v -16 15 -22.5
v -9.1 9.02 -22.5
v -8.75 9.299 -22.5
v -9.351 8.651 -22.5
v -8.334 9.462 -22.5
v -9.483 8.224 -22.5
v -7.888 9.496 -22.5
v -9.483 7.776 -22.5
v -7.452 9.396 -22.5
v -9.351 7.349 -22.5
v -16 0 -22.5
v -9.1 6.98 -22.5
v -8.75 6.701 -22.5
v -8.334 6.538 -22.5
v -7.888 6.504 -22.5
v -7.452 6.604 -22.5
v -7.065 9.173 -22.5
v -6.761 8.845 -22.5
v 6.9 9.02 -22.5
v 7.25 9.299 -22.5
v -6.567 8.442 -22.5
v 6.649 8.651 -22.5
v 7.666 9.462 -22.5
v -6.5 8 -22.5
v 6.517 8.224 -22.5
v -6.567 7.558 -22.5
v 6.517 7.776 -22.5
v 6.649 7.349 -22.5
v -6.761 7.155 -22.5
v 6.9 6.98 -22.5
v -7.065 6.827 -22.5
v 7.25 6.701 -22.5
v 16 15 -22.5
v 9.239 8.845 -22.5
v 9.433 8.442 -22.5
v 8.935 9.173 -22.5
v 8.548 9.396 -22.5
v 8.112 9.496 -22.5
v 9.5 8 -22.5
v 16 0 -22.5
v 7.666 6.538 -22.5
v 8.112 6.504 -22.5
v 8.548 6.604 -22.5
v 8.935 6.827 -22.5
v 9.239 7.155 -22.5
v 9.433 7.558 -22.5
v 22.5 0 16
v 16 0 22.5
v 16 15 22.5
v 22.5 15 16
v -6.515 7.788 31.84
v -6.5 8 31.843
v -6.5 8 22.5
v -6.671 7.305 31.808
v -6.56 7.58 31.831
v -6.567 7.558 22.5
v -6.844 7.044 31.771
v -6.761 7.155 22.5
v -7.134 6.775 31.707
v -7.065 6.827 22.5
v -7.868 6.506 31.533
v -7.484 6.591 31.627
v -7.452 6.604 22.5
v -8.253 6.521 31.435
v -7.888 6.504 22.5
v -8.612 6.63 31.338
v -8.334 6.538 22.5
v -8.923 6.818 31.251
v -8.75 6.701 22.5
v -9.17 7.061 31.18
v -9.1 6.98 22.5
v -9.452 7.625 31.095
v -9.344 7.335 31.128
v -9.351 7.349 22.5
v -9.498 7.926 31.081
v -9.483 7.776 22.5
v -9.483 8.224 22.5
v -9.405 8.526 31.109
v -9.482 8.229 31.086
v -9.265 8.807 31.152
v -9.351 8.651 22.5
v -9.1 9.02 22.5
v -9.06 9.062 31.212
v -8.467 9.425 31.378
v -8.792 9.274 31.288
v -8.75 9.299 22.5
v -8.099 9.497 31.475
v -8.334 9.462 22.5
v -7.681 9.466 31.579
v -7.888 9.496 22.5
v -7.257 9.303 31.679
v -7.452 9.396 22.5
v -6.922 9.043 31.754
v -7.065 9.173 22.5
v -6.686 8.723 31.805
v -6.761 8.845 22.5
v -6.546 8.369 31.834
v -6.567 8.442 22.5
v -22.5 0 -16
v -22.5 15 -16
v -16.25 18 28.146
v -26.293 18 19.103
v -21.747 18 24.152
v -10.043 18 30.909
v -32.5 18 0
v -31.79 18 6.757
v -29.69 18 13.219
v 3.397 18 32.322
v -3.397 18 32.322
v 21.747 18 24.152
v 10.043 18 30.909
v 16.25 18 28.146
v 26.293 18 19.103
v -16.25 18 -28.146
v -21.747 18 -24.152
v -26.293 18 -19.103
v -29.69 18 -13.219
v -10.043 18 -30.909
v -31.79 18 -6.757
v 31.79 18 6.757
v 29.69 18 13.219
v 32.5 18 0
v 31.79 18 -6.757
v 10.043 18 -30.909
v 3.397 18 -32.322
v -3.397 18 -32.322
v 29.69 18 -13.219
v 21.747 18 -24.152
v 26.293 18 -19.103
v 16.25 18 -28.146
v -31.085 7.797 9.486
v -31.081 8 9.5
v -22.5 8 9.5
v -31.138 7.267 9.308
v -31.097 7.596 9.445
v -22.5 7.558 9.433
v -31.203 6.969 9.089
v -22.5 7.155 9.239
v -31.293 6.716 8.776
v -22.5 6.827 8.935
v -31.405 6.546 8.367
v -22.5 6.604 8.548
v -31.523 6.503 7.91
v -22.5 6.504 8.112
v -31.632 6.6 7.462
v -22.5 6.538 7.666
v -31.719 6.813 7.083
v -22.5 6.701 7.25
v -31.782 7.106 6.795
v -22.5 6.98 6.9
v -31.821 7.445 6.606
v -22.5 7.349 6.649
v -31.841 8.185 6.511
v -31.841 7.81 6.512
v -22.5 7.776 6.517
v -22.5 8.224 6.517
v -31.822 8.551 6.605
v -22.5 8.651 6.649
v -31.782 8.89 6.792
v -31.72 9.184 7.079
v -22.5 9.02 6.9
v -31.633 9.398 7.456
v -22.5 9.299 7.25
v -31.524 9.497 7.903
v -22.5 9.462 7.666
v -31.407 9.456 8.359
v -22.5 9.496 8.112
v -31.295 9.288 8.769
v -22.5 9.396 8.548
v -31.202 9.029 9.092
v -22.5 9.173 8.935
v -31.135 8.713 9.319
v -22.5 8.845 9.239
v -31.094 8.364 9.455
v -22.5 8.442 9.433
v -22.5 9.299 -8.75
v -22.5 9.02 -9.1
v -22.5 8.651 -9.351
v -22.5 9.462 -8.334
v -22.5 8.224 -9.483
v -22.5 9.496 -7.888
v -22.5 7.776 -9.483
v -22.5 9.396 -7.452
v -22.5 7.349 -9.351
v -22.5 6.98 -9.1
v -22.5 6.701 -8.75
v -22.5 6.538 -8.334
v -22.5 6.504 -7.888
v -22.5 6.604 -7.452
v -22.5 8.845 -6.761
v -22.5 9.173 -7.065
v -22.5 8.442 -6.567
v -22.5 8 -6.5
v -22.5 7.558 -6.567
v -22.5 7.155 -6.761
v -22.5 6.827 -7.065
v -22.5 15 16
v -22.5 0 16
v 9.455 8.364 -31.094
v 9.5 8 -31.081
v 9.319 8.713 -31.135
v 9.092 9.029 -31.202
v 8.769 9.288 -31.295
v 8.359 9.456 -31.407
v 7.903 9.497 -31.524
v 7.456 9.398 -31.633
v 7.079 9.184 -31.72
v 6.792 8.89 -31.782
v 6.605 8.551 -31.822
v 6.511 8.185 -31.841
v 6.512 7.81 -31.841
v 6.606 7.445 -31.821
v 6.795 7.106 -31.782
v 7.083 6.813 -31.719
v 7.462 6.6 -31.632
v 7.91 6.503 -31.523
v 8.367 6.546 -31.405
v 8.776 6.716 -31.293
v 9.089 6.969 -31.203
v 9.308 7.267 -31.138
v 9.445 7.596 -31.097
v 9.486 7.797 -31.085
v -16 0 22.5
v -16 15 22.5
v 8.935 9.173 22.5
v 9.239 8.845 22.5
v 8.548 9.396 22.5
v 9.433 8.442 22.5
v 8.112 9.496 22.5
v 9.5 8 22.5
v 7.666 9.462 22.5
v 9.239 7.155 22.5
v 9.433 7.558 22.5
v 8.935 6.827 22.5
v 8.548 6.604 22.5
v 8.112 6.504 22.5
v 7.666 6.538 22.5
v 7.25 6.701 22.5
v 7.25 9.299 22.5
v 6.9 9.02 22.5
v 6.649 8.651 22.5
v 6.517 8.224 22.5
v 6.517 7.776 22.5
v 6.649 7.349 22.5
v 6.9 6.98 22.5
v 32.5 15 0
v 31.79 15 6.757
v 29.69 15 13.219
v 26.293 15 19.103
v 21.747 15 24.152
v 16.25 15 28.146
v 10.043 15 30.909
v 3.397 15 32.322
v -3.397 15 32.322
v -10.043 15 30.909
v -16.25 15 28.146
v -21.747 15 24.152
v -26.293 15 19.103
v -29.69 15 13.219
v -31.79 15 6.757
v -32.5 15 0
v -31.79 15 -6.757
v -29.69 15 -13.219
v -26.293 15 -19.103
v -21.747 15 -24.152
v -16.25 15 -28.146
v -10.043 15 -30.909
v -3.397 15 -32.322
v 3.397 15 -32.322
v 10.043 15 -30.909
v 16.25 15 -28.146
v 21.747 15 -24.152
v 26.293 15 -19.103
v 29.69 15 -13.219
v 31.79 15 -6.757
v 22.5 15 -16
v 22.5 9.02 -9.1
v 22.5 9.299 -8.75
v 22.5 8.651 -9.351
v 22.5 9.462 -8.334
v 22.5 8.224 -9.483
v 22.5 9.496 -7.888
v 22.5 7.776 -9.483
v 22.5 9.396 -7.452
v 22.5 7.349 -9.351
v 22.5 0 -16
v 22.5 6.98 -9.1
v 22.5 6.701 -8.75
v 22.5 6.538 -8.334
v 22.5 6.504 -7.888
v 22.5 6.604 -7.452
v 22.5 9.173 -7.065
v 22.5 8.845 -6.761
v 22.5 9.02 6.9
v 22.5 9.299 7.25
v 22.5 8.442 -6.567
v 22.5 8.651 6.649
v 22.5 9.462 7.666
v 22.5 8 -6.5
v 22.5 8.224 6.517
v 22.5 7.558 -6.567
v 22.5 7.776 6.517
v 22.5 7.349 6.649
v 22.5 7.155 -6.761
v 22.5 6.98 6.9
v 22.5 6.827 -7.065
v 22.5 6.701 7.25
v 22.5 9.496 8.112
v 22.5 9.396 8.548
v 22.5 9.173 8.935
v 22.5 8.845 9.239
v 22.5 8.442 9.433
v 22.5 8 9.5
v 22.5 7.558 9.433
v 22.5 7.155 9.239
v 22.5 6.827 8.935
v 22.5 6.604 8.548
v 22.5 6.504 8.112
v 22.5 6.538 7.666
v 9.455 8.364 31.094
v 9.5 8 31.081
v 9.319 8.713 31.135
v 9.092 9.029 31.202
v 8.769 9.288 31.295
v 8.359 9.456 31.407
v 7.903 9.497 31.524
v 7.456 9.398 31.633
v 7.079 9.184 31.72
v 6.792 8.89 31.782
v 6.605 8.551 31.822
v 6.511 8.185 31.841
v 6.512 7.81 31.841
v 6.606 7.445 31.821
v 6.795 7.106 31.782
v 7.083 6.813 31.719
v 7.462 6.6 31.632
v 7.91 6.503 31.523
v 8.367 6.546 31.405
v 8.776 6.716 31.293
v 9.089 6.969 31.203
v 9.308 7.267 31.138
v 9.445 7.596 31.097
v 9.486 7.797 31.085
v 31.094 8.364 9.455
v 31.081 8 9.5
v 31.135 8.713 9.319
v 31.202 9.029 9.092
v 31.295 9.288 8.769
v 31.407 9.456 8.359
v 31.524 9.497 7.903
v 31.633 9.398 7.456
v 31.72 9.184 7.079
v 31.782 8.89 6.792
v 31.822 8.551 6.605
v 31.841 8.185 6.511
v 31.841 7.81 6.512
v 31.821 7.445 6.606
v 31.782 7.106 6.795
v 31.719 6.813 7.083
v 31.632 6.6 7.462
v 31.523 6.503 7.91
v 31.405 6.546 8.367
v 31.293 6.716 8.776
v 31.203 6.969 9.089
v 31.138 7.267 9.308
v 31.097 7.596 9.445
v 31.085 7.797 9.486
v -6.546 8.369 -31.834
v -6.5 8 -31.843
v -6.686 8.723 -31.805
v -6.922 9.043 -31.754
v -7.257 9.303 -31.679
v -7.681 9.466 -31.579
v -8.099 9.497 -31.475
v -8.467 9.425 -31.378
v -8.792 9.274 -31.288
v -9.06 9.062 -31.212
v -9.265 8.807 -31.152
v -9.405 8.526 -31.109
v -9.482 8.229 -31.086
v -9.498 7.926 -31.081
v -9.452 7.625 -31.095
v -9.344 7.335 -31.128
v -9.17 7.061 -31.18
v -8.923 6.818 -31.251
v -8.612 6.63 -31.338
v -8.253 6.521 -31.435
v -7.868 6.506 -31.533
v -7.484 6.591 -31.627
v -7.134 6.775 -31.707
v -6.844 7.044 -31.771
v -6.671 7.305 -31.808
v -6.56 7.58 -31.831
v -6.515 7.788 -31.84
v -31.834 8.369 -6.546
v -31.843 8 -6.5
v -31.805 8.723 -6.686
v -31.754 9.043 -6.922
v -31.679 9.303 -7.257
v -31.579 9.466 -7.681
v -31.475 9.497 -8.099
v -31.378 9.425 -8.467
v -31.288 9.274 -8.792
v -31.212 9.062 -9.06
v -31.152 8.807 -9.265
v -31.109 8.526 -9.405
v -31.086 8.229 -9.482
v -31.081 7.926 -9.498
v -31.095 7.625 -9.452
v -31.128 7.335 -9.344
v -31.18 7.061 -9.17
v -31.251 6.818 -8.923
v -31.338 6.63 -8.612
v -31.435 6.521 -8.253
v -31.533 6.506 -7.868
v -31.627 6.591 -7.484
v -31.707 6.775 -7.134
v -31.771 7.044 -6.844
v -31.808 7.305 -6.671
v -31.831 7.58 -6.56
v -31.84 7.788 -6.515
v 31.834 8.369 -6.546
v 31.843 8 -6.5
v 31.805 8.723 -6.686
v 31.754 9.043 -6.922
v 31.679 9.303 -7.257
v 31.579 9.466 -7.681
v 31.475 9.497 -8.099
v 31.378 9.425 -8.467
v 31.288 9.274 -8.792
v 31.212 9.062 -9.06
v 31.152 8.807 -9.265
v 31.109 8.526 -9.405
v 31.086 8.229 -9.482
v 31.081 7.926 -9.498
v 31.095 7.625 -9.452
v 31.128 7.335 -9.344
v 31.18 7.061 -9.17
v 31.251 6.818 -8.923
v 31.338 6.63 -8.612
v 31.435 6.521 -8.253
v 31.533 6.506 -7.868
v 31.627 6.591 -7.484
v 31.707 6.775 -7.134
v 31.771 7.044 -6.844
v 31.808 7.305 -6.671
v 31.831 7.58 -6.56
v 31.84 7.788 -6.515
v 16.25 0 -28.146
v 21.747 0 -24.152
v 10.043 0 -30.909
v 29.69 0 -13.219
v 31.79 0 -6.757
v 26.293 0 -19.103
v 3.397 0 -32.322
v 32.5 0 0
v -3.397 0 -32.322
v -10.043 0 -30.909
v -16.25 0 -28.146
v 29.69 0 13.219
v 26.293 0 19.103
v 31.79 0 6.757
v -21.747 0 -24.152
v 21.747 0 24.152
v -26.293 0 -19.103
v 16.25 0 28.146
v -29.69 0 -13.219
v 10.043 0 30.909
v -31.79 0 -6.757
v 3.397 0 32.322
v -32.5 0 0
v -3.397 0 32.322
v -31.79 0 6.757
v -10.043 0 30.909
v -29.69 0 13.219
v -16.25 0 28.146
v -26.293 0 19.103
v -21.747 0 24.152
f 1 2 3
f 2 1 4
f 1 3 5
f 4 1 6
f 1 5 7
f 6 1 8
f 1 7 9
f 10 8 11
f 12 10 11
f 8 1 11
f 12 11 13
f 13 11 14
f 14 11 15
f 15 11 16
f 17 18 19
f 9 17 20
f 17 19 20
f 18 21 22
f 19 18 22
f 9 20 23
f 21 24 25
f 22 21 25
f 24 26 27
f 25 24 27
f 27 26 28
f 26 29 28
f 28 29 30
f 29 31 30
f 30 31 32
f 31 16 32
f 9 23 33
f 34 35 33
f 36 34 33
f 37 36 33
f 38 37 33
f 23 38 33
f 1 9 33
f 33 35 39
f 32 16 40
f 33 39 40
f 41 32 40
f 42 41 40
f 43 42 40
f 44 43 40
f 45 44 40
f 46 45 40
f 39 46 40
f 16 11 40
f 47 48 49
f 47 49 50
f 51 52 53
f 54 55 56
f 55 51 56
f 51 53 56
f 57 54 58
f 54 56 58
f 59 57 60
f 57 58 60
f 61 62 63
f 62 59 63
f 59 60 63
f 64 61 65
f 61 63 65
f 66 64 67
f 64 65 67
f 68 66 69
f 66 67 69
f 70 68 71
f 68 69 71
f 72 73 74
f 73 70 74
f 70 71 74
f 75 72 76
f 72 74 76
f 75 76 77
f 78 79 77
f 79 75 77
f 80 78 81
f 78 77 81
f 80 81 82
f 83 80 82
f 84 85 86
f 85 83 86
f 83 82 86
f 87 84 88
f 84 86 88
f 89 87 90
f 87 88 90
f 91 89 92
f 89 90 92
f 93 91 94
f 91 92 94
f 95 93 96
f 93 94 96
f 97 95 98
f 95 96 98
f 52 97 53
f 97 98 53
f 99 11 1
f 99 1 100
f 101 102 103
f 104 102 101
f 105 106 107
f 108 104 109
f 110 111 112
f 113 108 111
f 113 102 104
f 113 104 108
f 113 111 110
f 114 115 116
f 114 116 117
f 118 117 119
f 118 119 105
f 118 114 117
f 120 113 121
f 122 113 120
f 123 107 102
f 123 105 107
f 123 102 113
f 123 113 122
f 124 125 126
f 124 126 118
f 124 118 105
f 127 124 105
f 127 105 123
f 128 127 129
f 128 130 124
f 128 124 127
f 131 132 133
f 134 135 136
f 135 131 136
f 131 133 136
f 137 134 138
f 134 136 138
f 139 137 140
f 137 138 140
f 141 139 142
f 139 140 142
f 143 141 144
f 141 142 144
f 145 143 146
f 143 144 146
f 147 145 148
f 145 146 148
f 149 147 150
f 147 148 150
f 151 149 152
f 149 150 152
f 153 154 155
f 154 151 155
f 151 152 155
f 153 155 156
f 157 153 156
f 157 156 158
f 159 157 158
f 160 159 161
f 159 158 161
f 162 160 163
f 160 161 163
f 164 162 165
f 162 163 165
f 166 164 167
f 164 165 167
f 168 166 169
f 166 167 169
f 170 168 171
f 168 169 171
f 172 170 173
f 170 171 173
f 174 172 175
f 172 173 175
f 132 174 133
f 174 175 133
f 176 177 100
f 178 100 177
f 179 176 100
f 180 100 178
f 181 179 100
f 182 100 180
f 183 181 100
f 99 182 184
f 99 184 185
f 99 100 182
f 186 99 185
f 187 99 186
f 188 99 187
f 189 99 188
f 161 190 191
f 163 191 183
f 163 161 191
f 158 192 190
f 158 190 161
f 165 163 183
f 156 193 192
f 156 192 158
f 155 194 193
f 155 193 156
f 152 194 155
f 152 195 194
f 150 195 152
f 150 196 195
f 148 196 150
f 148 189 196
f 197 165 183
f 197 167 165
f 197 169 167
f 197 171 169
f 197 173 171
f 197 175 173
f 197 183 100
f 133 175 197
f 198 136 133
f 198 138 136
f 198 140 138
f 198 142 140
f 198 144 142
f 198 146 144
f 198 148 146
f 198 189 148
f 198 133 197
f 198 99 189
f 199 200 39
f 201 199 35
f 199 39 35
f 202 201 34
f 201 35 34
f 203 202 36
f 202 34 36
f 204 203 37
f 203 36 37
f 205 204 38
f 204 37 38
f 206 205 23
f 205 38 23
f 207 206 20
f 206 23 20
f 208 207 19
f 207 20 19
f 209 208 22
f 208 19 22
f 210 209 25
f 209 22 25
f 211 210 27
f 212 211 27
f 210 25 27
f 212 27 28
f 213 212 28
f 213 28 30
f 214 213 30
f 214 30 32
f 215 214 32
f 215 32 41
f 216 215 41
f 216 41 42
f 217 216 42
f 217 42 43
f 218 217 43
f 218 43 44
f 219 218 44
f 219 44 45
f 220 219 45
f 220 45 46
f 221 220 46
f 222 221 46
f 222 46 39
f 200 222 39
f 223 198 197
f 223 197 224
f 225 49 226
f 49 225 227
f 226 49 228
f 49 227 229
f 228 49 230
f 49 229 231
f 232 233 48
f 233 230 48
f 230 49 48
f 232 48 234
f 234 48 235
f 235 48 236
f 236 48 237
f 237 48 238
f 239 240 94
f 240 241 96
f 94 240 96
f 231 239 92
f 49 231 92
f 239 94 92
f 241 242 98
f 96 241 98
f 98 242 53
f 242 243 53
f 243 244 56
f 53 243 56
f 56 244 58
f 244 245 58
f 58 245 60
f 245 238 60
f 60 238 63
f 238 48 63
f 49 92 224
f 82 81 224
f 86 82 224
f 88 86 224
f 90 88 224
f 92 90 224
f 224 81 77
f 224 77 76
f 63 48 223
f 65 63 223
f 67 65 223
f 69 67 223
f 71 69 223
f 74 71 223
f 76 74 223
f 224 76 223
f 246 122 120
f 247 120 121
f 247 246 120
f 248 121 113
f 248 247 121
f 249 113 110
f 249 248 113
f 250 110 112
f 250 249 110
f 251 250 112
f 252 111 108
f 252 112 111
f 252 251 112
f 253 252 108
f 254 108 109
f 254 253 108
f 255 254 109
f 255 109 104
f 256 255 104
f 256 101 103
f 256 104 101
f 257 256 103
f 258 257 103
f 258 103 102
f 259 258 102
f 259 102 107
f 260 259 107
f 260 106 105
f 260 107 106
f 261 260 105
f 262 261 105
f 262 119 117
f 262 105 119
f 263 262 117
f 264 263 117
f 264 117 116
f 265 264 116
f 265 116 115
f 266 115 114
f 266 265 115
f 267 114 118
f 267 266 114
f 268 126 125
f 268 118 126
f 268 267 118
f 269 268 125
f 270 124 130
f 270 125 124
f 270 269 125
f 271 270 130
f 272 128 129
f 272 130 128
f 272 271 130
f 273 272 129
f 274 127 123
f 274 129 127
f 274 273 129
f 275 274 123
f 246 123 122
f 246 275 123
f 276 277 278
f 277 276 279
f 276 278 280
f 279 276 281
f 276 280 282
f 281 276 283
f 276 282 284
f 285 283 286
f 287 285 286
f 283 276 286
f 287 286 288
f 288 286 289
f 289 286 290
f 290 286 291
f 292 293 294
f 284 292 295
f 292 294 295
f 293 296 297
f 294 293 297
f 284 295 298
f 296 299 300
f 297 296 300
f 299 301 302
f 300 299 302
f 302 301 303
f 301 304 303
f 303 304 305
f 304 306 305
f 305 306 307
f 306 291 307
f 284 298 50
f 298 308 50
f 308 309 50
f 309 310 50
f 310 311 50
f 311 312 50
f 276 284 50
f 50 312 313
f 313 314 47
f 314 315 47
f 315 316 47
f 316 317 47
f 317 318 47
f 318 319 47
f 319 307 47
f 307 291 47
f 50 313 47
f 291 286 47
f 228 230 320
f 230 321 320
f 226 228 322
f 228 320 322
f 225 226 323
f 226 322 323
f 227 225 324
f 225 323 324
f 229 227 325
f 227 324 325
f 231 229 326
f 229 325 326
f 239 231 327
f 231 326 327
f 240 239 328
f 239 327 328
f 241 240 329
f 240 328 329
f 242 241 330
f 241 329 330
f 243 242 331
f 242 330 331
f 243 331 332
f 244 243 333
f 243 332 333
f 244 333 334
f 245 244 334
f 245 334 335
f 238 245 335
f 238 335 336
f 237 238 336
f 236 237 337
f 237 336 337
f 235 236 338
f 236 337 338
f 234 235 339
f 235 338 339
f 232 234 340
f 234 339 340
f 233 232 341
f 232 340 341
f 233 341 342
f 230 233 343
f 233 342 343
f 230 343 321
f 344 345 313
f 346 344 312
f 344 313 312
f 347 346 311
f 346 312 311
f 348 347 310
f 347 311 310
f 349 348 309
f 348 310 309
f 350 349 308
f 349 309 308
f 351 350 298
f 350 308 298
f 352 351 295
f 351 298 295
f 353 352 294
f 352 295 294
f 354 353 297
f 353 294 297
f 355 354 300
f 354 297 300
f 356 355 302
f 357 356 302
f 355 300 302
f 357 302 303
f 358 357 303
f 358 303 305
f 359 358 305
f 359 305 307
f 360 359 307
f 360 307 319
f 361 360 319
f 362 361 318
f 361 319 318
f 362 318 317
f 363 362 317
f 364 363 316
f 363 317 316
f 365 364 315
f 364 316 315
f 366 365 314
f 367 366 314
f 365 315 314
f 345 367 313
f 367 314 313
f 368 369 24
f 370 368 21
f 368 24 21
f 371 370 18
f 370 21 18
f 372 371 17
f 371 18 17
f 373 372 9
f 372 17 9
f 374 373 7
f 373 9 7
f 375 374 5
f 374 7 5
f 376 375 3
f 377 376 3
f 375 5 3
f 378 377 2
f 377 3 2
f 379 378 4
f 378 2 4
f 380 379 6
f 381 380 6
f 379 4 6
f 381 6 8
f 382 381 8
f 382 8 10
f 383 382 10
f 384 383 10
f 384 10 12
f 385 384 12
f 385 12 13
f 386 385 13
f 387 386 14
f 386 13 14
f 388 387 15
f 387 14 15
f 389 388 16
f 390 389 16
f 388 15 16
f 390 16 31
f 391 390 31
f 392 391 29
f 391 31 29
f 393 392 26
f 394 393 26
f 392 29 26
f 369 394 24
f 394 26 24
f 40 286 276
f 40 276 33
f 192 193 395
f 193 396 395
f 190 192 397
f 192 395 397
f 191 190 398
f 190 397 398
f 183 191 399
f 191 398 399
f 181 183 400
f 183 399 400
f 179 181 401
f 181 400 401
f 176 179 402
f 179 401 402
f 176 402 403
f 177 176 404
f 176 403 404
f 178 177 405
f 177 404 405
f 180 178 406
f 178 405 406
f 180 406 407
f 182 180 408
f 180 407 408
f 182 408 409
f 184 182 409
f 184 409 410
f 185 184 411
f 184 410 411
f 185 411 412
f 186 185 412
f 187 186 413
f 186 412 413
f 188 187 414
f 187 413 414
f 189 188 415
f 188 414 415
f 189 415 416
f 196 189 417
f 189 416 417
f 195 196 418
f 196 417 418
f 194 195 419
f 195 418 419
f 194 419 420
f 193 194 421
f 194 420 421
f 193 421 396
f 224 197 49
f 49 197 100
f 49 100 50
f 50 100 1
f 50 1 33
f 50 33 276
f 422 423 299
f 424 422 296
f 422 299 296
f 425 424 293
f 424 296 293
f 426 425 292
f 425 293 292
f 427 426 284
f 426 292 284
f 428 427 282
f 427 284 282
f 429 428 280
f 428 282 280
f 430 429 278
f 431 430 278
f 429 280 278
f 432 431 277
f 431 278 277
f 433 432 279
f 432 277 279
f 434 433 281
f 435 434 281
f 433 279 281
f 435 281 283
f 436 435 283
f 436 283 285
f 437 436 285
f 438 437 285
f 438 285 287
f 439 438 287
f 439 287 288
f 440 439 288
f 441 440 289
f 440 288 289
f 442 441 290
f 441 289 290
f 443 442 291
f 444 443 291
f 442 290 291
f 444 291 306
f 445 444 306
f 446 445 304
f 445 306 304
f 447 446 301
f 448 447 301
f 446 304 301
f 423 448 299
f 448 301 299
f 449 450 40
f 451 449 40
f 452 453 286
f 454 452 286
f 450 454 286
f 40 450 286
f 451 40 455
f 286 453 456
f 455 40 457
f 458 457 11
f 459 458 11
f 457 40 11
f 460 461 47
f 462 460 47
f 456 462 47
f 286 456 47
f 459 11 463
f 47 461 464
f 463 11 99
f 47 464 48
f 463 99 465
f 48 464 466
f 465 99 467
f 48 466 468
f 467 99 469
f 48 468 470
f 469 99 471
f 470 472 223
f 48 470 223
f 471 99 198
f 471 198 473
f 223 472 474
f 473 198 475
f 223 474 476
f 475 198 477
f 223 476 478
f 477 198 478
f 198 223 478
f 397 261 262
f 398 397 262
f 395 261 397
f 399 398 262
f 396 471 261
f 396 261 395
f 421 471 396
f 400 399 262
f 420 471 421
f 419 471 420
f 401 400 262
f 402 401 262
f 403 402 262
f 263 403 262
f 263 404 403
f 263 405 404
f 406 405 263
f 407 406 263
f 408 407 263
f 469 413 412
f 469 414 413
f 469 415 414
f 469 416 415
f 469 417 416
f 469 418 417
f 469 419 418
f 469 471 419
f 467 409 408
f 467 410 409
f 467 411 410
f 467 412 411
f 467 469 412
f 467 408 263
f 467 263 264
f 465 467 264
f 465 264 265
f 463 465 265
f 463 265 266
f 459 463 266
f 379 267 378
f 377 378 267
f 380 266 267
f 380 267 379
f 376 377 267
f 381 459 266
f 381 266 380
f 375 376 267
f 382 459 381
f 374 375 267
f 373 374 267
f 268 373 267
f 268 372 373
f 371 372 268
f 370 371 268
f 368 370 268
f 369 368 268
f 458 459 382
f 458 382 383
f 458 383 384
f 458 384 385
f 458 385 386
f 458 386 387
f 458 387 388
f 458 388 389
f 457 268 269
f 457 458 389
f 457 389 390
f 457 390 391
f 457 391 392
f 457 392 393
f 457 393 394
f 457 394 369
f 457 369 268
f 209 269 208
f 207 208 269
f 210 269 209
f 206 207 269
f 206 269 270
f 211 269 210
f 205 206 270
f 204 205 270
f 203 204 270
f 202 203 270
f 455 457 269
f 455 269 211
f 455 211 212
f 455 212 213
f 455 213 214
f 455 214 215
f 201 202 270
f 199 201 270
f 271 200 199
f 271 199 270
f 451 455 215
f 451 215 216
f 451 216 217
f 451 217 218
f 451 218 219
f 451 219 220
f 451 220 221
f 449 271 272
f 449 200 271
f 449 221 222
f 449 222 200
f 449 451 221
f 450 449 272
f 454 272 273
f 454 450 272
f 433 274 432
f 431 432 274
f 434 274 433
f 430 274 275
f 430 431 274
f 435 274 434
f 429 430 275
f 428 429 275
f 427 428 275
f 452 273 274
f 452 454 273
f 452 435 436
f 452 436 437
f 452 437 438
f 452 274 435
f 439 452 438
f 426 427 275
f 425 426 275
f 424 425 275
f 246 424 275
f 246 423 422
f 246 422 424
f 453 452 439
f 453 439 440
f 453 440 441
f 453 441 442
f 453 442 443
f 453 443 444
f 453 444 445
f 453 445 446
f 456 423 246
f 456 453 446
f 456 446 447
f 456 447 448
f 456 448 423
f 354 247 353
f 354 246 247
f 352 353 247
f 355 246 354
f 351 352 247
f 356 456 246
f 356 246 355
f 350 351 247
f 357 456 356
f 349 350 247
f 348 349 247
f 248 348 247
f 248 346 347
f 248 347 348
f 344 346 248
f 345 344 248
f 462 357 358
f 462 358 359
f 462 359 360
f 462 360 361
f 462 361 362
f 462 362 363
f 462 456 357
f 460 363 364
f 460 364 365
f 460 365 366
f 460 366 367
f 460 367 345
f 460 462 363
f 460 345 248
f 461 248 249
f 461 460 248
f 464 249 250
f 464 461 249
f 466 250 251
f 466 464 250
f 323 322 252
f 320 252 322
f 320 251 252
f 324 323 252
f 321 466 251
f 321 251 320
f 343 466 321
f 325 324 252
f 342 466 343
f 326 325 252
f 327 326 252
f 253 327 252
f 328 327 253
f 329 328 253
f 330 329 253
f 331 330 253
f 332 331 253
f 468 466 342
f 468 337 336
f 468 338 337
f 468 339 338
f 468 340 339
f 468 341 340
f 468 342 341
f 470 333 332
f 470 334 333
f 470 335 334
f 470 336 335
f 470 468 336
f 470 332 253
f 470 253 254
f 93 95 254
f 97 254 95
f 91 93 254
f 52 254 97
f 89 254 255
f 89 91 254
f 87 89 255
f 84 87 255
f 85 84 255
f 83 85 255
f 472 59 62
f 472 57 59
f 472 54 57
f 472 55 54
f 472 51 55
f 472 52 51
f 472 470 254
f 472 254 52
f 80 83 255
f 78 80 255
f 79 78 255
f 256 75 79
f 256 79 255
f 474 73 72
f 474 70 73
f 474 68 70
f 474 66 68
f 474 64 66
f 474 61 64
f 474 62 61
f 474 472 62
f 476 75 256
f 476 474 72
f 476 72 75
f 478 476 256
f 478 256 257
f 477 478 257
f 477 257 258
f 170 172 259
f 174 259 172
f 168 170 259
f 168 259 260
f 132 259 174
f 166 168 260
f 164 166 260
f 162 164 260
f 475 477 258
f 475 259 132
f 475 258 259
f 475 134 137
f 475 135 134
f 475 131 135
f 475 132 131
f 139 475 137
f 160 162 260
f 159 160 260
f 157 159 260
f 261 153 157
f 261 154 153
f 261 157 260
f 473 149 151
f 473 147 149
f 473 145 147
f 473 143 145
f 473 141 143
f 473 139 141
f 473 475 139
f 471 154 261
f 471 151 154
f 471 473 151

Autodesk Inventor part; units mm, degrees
ref_plane "YZ Plane" through (0, 0, 0) normal (1, 0, 0) x (0, 1, 0)
ref_plane "XZ Plane" through (0, 0, 0) normal (0, 1, 0) x (-1, 0, 0)
ref_plane "XY Plane" through (0, 0, 0) normal (0, 0, 1) x (1, 0, 0)
sketch "Boceto1" plane through (0, 0, 0) normal (0, 1, 0) x (-1, 0, 0)
  circle A0 centre (0, 0) radius 32.5
  line L0 (0, 0) -> (22.5, 0)
  line L1 (22.5, 0) -> (22.5, -16)
  line L2 (22.5, -16) -> (22.5, 16)
  line L3 (0, 0) -> (0, 22.5)
  line L4 (0, 22.5) -> (16, 22.5)
  line L5 (16, 22.5) -> (-16, 22.5)
  line L6 (0, 0) -> (-22.5, 0)
  line L7 (-22.5, 0) -> (-22.5, 16)
  line L8 (-22.5, 16) -> (-22.5, -16)
  line L9 (0, 0) -> (0, -22.5)
  line L10 (0, -22.5) -> (-16, -22.5)
  line L11 (-16, -22.5) -> (16, -22.5)
  line L12 (22.5, 16) -> (16, 22.5)
  line L13 (-16, 22.5) -> (-22.5, 16)
  line L14 (-22.5, -16) -> (-16, -22.5)
  line L15 (16, -22.5) -> (22.5, -16)
  dimension "d0" = 65
  dimension "d1" = 22.5
  dimension "d3" = 16
  dimension "d4" = 32
  dimension "d7" = 360
extrude "Extrusión1" add sketch "Boceto1" along normal blind 15
sketch "Boceto2" plane through (-16, 0, -22.5) normal (0, 0, 1) x (1, 0, 0)
  line L0 (16, 0) -> (16, 8)
  line L1 (16, 8) -> (24, 8)
  line L2 (24, 8) -> (8, 8)
  circle A0 centre (8, 8) radius 1.5
  circle A1 centre (24, 8) radius 1.5
  dimension "d11" = 8
  dimension "d12" = 8
  dimension "d13" = 16
  dimension "d15" = 3
  dimension "d16" = 3
extrude "Extrusión2" cut sketch "Boceto2" along normal mid plane 10200
sketch "Boceto3" plane through (22.5, 0, -16) normal (-1, 0, 0) x (0, 0, 1)
  line L0 (16, 0) -> (16, 8)
  line L1 (16, 8) -> (24, 8)
  line L2 (24, 8) -> (8, 8)
  circle A0 centre (8, 8) radius 1.5
  circle A1 centre (24, 8) radius 1.5
  dimension "d19" = 8
  dimension "d20" = 8
  dimension "d21" = 16
  dimension "d22" = 3
  dimension "d23" = 3
extrude "Extrusión3" cut sketch "Boceto3" against normal mid plane 10200
sketch "Boceto4" plane through (0, 15, 0) normal (0, 1, 0) x (1, 0, 0)
  circle A0 centre (0, 0) radius 32.5
extrude "Extrusión4" add sketch "Boceto4" along normal blind 3
properties part number "acople pinza"
